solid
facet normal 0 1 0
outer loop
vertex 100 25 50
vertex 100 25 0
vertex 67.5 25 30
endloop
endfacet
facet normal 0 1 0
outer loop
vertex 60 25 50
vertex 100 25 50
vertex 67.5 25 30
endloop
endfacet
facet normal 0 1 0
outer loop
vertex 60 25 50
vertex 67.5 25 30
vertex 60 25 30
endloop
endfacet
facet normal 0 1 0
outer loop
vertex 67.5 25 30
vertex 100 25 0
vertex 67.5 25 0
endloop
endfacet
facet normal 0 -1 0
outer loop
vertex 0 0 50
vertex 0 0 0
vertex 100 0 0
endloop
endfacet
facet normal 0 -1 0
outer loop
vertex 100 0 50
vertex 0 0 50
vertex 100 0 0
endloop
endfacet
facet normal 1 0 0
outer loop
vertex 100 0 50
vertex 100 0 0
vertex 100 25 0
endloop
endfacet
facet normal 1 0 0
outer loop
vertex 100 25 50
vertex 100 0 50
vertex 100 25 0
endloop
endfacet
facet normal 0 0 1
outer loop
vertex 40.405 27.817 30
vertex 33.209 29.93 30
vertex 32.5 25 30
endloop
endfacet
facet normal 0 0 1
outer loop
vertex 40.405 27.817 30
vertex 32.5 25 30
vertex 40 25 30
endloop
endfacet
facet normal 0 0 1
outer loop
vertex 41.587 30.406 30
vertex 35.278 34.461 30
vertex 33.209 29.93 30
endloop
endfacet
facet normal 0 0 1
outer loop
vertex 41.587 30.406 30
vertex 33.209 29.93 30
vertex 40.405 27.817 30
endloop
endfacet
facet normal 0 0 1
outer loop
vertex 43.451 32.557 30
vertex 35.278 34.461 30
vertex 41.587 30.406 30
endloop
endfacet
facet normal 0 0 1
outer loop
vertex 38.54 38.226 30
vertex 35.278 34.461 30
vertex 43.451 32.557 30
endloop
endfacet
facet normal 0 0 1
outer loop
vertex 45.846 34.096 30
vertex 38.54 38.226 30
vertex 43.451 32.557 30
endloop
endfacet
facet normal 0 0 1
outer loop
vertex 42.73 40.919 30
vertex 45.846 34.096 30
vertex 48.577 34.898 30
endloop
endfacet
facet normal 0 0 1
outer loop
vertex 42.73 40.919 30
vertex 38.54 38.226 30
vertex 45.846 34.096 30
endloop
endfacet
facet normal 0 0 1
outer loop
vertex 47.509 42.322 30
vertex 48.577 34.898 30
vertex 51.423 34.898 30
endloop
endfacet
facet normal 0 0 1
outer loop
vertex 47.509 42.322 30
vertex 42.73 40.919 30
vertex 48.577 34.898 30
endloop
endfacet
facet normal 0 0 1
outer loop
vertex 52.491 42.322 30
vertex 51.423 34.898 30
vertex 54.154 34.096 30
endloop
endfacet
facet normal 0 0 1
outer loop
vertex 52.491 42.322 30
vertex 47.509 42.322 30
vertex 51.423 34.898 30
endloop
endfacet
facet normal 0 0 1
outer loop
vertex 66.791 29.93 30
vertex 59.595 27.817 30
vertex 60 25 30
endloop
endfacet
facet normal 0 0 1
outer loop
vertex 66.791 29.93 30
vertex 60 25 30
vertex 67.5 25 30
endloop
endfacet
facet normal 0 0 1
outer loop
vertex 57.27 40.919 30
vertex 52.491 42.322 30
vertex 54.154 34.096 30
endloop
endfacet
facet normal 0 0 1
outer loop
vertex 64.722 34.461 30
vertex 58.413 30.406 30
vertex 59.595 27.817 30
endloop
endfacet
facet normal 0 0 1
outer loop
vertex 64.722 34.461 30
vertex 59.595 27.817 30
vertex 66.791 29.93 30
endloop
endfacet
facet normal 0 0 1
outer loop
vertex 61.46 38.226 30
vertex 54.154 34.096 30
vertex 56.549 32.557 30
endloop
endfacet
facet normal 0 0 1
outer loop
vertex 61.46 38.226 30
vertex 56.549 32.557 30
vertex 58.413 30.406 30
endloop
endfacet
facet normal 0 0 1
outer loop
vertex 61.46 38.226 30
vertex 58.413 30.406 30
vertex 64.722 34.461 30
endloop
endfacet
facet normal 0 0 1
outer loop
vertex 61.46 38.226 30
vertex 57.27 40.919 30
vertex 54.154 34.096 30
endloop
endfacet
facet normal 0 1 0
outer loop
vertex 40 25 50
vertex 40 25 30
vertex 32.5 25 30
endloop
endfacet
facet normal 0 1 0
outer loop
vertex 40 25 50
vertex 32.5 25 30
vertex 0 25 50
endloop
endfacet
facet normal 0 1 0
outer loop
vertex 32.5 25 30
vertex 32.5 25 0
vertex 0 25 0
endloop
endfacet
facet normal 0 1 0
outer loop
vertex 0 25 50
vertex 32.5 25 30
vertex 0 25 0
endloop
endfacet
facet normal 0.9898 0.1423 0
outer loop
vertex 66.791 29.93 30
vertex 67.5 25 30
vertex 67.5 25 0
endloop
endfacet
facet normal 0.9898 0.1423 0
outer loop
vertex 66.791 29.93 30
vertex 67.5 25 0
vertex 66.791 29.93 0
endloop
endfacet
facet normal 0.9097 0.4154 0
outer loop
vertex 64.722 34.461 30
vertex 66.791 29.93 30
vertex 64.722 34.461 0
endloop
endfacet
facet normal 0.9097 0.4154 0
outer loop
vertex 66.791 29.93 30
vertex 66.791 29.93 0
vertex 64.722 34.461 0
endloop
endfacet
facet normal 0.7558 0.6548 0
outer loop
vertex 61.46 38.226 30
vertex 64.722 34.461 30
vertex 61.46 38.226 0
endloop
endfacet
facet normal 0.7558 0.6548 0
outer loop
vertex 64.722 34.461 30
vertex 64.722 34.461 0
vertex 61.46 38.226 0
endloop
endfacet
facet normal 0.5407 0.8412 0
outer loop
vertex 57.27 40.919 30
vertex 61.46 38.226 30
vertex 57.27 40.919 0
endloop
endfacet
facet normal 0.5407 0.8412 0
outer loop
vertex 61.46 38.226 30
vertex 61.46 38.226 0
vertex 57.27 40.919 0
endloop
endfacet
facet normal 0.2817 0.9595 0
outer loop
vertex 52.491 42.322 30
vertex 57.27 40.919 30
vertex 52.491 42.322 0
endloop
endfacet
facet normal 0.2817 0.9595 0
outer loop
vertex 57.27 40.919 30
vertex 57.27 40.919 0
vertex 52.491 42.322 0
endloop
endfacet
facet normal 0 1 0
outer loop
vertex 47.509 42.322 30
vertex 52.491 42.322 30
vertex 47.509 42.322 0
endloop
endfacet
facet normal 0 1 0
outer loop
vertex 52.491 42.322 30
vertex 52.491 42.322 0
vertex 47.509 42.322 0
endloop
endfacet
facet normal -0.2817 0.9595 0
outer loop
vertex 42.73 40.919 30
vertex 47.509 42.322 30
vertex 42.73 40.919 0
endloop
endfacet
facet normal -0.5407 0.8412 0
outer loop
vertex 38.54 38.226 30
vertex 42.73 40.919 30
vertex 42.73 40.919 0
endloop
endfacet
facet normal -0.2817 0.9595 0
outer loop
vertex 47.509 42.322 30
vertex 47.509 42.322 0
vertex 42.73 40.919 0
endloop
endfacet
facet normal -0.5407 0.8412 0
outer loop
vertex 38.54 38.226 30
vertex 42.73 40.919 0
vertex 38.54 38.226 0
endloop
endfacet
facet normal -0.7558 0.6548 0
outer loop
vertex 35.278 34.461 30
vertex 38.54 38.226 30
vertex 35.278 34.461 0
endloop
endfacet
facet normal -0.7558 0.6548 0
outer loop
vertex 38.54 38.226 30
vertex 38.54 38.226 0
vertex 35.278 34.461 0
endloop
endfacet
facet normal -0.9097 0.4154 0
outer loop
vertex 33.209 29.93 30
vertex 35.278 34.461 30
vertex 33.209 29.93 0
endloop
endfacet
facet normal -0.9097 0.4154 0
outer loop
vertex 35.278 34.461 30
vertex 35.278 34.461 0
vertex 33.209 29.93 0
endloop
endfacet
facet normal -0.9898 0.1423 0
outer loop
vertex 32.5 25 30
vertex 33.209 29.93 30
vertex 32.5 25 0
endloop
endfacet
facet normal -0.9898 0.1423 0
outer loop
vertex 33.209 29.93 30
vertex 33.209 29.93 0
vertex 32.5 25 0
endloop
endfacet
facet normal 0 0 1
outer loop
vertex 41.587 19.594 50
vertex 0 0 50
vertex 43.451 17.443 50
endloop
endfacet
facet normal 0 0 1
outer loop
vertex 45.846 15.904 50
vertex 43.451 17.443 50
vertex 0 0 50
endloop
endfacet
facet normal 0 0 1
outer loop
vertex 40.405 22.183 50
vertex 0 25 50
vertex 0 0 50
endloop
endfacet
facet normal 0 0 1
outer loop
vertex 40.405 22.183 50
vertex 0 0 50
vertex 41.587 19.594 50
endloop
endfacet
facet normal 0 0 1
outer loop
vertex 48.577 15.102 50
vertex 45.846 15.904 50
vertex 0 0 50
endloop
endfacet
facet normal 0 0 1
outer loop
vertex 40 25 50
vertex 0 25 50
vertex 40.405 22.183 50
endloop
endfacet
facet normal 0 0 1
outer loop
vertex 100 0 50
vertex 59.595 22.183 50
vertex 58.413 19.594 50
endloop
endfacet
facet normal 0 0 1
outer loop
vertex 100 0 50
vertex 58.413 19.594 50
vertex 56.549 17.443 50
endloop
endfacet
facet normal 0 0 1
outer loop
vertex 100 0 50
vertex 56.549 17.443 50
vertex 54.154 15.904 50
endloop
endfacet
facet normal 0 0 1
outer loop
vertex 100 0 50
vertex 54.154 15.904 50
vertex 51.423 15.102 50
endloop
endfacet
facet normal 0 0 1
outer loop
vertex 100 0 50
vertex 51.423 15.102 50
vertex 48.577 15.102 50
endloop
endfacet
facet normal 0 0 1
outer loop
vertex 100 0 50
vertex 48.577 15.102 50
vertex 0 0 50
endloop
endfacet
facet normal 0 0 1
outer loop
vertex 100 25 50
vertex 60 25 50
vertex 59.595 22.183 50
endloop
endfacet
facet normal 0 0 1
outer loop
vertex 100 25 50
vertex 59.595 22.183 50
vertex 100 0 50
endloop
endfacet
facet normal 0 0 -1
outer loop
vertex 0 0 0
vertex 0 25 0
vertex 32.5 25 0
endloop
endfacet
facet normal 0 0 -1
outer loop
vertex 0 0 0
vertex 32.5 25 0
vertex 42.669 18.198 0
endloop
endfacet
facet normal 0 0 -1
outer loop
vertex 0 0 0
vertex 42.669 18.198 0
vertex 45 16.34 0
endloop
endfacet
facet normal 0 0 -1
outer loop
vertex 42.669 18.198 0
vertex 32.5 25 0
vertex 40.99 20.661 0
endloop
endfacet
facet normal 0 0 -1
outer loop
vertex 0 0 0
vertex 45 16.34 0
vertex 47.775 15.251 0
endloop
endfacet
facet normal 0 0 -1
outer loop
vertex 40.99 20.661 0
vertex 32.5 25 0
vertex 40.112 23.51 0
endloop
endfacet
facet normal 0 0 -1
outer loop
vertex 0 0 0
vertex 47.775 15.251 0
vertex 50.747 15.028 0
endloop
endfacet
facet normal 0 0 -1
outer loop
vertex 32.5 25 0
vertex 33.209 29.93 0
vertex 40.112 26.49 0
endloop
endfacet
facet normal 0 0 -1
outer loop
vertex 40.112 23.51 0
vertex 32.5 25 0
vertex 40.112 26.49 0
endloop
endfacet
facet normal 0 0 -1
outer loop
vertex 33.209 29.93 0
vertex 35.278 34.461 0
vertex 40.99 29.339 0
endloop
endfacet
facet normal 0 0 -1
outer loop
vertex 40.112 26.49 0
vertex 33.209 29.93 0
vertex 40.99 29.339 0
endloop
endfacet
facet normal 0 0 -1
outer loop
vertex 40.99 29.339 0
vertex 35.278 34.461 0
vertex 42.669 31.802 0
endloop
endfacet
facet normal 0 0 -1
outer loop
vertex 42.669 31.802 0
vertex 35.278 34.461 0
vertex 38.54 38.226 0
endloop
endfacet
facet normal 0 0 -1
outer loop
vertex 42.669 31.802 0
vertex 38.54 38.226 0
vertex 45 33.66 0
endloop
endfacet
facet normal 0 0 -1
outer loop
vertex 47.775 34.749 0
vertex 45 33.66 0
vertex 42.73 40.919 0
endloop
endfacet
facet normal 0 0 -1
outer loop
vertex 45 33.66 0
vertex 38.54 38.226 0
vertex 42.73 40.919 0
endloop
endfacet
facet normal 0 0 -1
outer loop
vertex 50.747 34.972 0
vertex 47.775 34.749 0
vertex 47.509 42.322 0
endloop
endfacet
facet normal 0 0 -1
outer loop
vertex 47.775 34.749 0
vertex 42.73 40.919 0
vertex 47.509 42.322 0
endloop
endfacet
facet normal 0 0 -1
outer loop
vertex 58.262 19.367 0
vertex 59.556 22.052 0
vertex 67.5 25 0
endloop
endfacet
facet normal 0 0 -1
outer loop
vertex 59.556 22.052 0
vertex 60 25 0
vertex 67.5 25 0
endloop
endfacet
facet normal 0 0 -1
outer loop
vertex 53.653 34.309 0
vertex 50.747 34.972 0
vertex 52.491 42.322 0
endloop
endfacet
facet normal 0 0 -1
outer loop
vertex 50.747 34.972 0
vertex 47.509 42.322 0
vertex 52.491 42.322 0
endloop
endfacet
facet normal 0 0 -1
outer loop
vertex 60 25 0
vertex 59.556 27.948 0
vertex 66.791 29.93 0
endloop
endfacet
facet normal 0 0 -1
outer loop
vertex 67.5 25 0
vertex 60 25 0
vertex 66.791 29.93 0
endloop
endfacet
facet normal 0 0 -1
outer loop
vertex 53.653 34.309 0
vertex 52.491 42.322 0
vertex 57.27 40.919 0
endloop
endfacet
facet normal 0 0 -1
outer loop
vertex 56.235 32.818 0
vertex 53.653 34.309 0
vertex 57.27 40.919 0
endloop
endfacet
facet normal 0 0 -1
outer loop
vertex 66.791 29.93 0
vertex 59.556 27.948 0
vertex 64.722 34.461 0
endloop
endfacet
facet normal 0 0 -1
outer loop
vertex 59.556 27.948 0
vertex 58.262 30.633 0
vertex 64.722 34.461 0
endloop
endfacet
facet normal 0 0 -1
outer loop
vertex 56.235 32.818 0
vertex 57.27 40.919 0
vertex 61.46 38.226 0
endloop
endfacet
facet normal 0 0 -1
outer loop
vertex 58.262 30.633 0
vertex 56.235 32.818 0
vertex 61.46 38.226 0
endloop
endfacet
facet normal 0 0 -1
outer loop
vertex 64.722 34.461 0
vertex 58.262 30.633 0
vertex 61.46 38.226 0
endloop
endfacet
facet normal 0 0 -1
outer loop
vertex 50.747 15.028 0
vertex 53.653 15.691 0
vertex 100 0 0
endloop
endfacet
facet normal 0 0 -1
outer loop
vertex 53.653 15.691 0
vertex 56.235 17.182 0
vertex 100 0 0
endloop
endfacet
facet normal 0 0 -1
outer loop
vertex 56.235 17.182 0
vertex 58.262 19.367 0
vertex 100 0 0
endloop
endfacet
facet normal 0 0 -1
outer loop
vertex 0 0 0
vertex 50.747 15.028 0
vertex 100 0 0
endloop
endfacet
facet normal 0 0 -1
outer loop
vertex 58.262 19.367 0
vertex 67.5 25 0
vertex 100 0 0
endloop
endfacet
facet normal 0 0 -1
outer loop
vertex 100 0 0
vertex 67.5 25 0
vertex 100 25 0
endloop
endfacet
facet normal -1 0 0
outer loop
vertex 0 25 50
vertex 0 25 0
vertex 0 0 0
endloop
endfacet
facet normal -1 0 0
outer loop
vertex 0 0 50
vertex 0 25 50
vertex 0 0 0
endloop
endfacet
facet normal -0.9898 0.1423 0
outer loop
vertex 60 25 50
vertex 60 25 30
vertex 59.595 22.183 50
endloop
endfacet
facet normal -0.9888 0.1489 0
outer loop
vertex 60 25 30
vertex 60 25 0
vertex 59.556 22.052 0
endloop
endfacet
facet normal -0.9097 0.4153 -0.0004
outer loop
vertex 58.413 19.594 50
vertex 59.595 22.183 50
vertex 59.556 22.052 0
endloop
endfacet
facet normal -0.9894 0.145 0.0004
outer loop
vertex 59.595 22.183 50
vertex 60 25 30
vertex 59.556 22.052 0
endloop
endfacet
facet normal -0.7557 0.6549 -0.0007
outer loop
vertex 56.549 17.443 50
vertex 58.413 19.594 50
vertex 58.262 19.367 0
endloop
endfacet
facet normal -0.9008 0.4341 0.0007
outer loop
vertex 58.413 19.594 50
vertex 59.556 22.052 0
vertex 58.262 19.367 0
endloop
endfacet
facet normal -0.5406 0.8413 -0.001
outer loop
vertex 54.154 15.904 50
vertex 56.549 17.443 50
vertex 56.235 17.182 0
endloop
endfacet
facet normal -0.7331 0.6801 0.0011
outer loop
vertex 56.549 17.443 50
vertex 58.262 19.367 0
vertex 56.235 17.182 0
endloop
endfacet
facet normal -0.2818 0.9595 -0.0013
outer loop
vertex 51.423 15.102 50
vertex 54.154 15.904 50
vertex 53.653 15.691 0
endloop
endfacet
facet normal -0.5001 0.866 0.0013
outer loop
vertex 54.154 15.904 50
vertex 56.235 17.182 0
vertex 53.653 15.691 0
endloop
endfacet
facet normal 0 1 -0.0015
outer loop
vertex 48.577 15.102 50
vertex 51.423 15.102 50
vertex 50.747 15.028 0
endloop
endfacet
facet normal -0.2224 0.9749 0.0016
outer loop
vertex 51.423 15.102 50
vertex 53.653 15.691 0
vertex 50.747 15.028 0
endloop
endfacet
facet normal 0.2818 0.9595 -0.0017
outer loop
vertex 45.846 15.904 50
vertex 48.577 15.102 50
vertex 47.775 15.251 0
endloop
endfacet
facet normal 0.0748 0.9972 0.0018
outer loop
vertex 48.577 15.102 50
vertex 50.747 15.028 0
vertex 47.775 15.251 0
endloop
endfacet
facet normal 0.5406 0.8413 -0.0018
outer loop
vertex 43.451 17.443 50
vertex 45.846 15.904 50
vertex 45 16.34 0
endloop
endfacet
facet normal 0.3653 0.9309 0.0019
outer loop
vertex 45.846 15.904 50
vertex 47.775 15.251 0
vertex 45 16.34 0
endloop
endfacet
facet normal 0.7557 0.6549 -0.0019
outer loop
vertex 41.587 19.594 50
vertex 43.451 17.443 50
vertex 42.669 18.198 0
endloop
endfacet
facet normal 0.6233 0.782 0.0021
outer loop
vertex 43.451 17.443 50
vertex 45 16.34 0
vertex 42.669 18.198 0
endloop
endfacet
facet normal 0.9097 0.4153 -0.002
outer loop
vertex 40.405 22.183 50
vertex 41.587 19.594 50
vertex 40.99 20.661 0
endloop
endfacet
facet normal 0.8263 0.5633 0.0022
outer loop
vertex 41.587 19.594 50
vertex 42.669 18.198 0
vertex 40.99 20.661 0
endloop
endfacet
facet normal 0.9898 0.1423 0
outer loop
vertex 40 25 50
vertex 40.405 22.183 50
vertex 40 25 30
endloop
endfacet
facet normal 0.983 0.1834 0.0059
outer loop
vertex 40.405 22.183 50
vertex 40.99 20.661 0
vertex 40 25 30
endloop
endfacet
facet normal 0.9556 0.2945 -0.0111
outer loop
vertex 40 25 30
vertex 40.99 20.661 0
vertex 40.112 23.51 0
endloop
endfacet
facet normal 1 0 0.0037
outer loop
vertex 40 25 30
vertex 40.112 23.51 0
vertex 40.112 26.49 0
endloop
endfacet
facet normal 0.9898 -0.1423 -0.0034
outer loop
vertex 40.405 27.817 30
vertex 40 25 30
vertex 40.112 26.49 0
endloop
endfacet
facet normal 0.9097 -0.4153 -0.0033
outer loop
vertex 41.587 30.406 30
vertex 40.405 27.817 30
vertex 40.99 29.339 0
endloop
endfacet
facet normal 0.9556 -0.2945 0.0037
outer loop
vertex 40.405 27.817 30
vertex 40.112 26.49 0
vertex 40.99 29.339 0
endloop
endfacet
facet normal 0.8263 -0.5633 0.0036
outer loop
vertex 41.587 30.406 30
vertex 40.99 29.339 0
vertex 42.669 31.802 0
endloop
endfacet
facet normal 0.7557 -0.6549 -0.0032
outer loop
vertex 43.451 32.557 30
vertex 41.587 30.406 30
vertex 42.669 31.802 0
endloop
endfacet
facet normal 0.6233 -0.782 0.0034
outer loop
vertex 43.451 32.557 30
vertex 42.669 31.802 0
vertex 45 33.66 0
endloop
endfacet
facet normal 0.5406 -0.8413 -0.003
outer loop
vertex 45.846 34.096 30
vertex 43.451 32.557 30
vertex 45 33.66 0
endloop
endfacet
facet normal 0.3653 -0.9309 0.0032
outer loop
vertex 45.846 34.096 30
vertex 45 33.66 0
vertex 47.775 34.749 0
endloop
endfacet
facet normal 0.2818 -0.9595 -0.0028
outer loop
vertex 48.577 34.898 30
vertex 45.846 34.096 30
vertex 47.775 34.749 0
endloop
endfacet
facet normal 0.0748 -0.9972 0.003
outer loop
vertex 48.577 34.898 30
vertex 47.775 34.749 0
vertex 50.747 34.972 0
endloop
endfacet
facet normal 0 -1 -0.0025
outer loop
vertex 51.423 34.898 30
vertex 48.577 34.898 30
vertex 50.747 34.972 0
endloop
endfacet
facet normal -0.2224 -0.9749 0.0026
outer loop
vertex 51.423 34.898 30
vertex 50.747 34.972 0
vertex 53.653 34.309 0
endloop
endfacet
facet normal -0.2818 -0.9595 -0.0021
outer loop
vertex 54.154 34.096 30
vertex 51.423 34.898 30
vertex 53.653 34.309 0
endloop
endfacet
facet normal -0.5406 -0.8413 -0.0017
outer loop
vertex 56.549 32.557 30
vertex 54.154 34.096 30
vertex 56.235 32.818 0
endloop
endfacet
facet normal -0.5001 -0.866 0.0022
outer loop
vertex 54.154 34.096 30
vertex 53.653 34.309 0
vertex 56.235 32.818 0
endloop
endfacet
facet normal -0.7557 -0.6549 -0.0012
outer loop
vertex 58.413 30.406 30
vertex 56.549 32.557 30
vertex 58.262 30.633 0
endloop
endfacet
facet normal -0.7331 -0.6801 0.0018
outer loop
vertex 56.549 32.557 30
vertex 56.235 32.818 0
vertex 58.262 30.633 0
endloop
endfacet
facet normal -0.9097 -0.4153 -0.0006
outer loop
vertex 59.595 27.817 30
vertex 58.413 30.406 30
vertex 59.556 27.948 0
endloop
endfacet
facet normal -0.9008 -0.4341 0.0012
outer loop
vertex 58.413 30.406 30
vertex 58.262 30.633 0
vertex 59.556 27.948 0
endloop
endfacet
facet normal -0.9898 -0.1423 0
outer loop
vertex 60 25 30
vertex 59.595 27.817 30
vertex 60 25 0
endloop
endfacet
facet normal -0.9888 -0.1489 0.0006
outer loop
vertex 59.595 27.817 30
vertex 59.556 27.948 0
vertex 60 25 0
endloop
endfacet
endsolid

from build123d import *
from build123d.topology import SkipClean

# Parameters (mm, degrees)
BOSS_EXTRUDE1_DEPTH = 50
SKETCH1_3_R         = 17.5
SKETCH1_3_R_2       = 10
BOSS_EXTRUDE2_DEPTH = 30


with BuildPart() as part:
    # Sketch1 → Boss-Extrude1 (new body)
    with BuildSketch(Plane.XY):
        with BuildLine():
            Line((0, 25), (0, 0))
            Line((0, 0), (100, 0))
            Line((100, 0), (100, 25))
            Line((100, 25), (60, 25))
            ThreePointArc((60, 25), (50, 15), (40, 25))
            Line((40, 25), (0, 25))
        make_face()
    extrude(amount=BOSS_EXTRUDE1_DEPTH)

    # Sketch1<3> → Boss-Extrude2 (add)
    with SkipClean():  # the faces are left unmerged after this step: merging them gives an invalid solid
        with BuildSketch(Plane.XY):
            with Locations((50, 25)):
                Circle(SKETCH1_3_R)
            with Locations((50, 25)):
                Circle(SKETCH1_3_R_2, mode=Mode.SUBTRACT)
        extrude(amount=BOSS_EXTRUDE2_DEPTH)


solid = part.part
